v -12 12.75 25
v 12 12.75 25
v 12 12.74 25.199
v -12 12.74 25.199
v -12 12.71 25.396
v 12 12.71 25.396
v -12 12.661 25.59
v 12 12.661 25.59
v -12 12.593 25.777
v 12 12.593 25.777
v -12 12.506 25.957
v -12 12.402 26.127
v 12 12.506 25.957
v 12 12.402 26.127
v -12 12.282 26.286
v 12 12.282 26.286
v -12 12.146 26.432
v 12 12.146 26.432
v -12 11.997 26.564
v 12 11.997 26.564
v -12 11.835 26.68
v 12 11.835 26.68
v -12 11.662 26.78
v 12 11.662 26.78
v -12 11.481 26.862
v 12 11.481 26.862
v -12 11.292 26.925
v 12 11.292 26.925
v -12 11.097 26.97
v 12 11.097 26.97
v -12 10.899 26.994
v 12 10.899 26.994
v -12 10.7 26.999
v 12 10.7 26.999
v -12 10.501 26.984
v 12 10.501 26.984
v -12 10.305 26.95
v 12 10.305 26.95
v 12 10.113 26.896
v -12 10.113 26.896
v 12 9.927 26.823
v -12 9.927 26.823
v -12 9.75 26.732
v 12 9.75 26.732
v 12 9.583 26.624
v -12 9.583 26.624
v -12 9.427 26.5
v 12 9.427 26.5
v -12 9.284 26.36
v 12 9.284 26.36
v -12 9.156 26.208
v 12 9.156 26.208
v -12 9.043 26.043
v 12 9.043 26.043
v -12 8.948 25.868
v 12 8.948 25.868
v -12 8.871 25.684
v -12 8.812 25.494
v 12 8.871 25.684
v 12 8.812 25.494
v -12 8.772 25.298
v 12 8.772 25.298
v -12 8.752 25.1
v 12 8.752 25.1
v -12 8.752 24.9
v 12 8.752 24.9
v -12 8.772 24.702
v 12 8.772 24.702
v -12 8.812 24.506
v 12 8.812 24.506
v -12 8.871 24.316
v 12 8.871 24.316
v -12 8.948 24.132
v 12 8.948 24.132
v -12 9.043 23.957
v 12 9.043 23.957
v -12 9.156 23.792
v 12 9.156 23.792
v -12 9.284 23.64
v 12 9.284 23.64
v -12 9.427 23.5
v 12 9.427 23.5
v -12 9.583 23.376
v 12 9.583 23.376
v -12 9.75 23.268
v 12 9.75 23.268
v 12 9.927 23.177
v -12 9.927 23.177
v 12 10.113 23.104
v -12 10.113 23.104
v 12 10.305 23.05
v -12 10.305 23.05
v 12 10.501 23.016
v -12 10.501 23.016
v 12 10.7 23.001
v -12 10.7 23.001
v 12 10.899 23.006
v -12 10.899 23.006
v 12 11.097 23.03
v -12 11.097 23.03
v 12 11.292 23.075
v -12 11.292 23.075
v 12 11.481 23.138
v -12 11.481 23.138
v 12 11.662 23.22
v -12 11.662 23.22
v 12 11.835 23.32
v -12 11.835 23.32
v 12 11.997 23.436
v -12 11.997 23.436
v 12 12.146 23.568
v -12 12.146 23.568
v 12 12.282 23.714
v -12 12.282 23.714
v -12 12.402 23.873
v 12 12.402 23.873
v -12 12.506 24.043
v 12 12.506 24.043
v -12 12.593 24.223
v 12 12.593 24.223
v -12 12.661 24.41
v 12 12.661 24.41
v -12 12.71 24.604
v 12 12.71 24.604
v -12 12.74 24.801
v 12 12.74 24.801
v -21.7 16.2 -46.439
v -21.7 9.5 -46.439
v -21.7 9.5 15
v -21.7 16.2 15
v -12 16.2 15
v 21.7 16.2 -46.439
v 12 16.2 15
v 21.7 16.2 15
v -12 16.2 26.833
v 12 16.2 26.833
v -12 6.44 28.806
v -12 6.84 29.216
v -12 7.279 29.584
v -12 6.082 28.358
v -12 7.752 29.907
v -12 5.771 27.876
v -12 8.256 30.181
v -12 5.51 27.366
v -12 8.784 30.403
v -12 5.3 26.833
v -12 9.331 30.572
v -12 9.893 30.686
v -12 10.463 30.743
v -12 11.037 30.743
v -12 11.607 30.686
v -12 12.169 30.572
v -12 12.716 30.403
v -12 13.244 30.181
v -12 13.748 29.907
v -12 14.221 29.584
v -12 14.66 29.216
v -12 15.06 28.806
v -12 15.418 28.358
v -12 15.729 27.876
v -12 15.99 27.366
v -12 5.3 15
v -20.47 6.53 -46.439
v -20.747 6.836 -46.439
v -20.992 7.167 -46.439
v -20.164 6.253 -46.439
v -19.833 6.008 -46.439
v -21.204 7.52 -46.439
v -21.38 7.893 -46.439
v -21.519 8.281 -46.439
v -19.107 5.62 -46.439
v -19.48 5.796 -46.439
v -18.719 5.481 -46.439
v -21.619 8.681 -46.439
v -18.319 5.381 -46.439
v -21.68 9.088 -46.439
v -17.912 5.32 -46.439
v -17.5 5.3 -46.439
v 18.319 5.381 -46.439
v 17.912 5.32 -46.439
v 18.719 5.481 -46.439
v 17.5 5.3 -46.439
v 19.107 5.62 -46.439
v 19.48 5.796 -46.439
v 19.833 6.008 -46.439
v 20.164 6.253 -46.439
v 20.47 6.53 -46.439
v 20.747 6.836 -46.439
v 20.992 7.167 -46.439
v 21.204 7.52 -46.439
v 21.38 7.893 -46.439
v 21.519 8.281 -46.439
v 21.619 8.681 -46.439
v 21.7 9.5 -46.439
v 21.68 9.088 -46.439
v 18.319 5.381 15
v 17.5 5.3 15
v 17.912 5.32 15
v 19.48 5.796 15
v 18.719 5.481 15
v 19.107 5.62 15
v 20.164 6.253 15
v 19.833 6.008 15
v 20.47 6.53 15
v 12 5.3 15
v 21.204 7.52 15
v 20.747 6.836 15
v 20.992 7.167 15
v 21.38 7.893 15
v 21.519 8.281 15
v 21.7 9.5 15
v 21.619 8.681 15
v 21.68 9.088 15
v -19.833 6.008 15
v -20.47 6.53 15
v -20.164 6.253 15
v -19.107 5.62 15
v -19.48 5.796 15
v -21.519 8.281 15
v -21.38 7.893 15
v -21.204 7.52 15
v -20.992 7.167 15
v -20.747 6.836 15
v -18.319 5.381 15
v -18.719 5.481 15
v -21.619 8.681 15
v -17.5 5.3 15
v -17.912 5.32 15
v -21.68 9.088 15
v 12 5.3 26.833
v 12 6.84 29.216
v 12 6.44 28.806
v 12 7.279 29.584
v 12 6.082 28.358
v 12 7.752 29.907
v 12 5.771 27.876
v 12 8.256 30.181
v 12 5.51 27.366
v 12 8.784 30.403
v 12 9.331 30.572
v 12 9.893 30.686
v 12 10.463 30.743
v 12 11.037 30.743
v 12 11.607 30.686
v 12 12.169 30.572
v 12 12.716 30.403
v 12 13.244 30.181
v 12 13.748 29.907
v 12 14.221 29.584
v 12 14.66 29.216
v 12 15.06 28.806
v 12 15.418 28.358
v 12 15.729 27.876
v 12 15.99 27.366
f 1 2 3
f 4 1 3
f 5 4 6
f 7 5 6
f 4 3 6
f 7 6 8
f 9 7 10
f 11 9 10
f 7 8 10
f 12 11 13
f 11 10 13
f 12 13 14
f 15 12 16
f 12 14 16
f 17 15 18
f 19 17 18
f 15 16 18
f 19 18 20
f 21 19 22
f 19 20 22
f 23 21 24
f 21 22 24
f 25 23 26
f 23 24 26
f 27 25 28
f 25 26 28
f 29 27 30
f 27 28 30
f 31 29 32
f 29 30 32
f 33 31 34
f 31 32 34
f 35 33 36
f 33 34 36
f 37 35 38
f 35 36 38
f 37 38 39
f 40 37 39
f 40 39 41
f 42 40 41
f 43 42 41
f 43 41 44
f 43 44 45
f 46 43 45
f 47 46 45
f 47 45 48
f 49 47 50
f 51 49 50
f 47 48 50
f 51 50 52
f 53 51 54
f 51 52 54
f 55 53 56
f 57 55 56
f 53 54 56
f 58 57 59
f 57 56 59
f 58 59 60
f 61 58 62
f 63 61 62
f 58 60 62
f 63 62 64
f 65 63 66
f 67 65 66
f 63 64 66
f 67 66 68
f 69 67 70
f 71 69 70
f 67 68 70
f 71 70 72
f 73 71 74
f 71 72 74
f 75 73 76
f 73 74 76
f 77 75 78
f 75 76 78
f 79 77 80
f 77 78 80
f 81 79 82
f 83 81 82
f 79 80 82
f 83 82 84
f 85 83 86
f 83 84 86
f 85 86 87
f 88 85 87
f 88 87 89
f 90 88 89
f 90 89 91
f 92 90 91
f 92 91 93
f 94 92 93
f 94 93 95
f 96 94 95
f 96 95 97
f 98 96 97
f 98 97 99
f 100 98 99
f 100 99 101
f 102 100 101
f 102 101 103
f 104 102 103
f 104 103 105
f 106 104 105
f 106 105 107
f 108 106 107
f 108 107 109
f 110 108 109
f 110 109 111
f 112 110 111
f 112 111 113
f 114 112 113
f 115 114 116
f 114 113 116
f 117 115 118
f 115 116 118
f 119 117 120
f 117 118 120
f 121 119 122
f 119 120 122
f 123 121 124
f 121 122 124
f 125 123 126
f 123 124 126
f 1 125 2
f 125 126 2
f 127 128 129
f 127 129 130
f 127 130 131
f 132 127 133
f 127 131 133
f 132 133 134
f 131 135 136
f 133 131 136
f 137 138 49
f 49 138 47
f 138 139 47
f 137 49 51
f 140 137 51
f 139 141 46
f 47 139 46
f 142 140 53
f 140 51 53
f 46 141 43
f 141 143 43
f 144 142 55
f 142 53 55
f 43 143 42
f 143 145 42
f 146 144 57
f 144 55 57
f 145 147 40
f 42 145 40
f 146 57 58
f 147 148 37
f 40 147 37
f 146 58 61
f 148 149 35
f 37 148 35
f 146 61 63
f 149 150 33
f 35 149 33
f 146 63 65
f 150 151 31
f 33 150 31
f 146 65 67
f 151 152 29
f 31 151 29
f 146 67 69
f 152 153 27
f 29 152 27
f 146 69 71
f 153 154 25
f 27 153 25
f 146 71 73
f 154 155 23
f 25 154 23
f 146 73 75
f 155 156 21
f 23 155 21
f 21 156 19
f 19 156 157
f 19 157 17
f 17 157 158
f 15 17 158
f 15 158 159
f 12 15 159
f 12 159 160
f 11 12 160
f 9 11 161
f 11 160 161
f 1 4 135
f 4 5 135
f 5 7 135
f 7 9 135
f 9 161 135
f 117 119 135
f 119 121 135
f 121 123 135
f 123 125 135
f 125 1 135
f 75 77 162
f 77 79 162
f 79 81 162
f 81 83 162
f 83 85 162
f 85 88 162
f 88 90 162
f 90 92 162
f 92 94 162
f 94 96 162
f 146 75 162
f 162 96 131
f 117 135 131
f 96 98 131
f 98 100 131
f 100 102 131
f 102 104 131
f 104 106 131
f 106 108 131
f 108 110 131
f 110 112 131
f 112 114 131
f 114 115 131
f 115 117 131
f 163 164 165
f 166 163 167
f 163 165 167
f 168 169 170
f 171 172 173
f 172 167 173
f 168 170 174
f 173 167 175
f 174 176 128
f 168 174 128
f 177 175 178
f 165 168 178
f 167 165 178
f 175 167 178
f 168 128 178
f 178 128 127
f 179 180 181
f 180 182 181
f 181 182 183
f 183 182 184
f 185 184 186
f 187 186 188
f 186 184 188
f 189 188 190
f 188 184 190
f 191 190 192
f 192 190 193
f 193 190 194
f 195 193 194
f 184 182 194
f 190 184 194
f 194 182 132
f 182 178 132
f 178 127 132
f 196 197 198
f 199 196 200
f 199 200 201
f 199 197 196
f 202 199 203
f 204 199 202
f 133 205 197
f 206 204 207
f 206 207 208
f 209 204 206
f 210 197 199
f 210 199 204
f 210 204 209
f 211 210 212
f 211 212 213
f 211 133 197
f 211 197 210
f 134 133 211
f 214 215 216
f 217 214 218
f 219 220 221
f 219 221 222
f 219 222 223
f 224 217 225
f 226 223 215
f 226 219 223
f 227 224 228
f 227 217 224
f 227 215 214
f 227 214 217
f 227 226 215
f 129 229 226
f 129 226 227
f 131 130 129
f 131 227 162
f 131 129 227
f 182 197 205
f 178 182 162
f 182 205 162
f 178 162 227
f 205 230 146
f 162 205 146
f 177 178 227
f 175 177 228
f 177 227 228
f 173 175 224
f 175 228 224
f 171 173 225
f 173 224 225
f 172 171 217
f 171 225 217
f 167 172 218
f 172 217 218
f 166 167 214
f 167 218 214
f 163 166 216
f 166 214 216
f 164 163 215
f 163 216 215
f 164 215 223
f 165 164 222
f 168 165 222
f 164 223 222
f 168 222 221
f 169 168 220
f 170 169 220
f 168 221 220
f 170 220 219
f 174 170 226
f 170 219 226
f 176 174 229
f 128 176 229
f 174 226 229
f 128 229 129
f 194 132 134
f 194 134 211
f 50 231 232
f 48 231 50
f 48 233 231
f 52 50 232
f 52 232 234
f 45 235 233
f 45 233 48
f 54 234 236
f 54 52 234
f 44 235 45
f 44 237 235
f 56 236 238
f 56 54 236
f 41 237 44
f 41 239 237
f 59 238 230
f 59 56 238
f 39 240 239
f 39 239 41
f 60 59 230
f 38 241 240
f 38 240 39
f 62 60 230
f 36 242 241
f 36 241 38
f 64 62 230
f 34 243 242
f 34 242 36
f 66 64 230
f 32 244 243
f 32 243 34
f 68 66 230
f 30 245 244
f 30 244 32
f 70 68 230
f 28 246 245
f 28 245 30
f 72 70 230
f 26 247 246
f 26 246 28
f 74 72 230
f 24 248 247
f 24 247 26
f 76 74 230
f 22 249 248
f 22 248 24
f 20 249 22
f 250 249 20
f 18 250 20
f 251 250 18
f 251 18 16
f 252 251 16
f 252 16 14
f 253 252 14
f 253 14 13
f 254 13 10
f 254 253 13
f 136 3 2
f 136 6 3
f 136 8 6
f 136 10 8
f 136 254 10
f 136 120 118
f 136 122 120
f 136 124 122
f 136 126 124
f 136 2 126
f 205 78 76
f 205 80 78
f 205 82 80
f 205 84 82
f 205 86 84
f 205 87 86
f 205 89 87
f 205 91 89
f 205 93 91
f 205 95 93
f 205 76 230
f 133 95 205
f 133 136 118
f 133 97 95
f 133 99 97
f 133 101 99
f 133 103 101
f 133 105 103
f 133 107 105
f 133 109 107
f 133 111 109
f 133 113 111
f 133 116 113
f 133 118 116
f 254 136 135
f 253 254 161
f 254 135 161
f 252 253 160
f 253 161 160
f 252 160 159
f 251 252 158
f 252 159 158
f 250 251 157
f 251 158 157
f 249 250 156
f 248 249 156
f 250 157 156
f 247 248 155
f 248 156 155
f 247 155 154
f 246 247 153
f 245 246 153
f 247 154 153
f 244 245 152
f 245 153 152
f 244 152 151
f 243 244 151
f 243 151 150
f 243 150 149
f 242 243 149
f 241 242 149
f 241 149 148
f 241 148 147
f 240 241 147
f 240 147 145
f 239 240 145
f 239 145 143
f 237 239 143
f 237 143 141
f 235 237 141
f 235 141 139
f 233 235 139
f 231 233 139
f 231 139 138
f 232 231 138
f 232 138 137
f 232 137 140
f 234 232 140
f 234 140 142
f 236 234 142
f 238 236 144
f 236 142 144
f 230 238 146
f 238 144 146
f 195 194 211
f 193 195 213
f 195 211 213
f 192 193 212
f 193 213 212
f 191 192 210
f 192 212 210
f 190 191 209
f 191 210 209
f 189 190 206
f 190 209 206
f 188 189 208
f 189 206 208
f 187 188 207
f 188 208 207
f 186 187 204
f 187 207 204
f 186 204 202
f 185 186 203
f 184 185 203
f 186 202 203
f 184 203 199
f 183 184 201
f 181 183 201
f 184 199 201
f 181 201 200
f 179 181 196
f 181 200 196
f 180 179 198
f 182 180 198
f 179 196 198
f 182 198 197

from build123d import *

# Parameters (mm, degrees)
BOSS_EXTRUDE1_START = -46.439051
BOSS_EXTRUDE1_DEPTH = 61.439051
SKETCH2_W           = 24
SKETCH2_H           = 11.5
BOSS_EXTRUDE2_DEPTH = 10
BOSS_EXTRUDE3_START = -24
BOSS_EXTRUDE3_DEPTH = 24
SKETCH4_R           = 2
CUT_EXTRUDE1_DEPTH  = 24
CUT_EXTRUDE2_START  = -73.272081
CUT_EXTRUDE2_DEPTH  = 73.272081


with BuildPart() as part:
    # Sketch1 → Boss-Extrude1 (new body)
    with BuildSketch(Plane.XY.offset(BOSS_EXTRUDE1_START)):
        with BuildLine():
            Line((-17.5, 16.5), (-22, 16.5))
            Line((-22, 16.5), (-22, 9.5))
            ThreePointArc((-22, 9.5), (-20.681980515, 6.318019485), (-17.5, 5))
            Line((-17.5, 5), (17.5, 5))
            ThreePointArc((17.5, 5), (20.681980515, 6.318019485), (22, 9.5))
            Line((22, 9.5), (22, 16.5))
            Line((22, 16.5), (-17.5, 16.5))
        make_face()
    extrude(amount=BOSS_EXTRUDE1_DEPTH)

    # Sketch2 → Boss-Extrude2 (add)
    with BuildSketch(Plane.XY.offset(15)):
        with Locations((0, 10.75)):
            Rectangle(SKETCH2_W, SKETCH2_H)
    extrude(amount=BOSS_EXTRUDE2_DEPTH)

    # Sketch3 → Boss-Extrude3 (add)
    with BuildSketch(Plane(origin=(12, 0, 0), x_dir=(0, 0, -1), z_dir=(1, 0, 0)).offset(BOSS_EXTRUDE3_START)):
        with BuildLine():
            Line((-25, 5), (-25, 16.5))
            ThreePointArc((-25, 16.5), (-30.75, 10.75), (-25, 5))
        make_face()
    extrude(amount=BOSS_EXTRUDE3_DEPTH)

    # Sketch4 → Cut-Extrude1 (cut)
    with BuildSketch(Plane(origin=(12, 0, 0), x_dir=(0, 0, -1), z_dir=(1, 0, 0))):
        with Locations(Location((-25, 10.75, 0), (0, 0, 90))):
            Circle(SKETCH4_R)
    extrude(amount=-CUT_EXTRUDE1_DEPTH, mode=Mode.SUBTRACT)

    # Sketch5 → Cut-Extrude2 (cut)
    with BuildSketch(Plane(origin=(0, 0, -46.439050788), x_dir=(-1, 0, 0), z_dir=(0, 0, -1)).offset(CUT_EXTRUDE2_START)):
        with BuildLine():
            Line((22, 16.5), (-22, 16.5))
            Line((-22, 16.5), (-22, 9.5))
            ThreePointArc((-22, 9.5), (-20.681980515, 6.318019485), (-17.5, 5))
            Line((-17.5, 5), (17.5, 5))
            ThreePointArc((17.5, 5), (20.681980515, 6.318019485), (22, 9.5))
            Line((22, 9.5), (22, 16.5))
        make_face()
        with BuildLine():
            Line((21.7, 16.2), (-21.7, 16.2))
            Line((-21.7, 16.2), (-21.7, 9.5))
            ThreePointArc((-21.7, 9.5), (-20.469848481, 6.530151519), (-17.5, 5.3))
            Line((-17.5, 5.3), (17.5, 5.3))
            ThreePointArc((17.5, 5.3), (20.469848481, 6.530151519), (21.7, 9.5))
            Line((21.7, 9.5), (21.7, 16.2))
        make_face(mode=Mode.SUBTRACT)
    extrude(amount=CUT_EXTRUDE2_DEPTH, mode=Mode.SUBTRACT)


solid = part.part
